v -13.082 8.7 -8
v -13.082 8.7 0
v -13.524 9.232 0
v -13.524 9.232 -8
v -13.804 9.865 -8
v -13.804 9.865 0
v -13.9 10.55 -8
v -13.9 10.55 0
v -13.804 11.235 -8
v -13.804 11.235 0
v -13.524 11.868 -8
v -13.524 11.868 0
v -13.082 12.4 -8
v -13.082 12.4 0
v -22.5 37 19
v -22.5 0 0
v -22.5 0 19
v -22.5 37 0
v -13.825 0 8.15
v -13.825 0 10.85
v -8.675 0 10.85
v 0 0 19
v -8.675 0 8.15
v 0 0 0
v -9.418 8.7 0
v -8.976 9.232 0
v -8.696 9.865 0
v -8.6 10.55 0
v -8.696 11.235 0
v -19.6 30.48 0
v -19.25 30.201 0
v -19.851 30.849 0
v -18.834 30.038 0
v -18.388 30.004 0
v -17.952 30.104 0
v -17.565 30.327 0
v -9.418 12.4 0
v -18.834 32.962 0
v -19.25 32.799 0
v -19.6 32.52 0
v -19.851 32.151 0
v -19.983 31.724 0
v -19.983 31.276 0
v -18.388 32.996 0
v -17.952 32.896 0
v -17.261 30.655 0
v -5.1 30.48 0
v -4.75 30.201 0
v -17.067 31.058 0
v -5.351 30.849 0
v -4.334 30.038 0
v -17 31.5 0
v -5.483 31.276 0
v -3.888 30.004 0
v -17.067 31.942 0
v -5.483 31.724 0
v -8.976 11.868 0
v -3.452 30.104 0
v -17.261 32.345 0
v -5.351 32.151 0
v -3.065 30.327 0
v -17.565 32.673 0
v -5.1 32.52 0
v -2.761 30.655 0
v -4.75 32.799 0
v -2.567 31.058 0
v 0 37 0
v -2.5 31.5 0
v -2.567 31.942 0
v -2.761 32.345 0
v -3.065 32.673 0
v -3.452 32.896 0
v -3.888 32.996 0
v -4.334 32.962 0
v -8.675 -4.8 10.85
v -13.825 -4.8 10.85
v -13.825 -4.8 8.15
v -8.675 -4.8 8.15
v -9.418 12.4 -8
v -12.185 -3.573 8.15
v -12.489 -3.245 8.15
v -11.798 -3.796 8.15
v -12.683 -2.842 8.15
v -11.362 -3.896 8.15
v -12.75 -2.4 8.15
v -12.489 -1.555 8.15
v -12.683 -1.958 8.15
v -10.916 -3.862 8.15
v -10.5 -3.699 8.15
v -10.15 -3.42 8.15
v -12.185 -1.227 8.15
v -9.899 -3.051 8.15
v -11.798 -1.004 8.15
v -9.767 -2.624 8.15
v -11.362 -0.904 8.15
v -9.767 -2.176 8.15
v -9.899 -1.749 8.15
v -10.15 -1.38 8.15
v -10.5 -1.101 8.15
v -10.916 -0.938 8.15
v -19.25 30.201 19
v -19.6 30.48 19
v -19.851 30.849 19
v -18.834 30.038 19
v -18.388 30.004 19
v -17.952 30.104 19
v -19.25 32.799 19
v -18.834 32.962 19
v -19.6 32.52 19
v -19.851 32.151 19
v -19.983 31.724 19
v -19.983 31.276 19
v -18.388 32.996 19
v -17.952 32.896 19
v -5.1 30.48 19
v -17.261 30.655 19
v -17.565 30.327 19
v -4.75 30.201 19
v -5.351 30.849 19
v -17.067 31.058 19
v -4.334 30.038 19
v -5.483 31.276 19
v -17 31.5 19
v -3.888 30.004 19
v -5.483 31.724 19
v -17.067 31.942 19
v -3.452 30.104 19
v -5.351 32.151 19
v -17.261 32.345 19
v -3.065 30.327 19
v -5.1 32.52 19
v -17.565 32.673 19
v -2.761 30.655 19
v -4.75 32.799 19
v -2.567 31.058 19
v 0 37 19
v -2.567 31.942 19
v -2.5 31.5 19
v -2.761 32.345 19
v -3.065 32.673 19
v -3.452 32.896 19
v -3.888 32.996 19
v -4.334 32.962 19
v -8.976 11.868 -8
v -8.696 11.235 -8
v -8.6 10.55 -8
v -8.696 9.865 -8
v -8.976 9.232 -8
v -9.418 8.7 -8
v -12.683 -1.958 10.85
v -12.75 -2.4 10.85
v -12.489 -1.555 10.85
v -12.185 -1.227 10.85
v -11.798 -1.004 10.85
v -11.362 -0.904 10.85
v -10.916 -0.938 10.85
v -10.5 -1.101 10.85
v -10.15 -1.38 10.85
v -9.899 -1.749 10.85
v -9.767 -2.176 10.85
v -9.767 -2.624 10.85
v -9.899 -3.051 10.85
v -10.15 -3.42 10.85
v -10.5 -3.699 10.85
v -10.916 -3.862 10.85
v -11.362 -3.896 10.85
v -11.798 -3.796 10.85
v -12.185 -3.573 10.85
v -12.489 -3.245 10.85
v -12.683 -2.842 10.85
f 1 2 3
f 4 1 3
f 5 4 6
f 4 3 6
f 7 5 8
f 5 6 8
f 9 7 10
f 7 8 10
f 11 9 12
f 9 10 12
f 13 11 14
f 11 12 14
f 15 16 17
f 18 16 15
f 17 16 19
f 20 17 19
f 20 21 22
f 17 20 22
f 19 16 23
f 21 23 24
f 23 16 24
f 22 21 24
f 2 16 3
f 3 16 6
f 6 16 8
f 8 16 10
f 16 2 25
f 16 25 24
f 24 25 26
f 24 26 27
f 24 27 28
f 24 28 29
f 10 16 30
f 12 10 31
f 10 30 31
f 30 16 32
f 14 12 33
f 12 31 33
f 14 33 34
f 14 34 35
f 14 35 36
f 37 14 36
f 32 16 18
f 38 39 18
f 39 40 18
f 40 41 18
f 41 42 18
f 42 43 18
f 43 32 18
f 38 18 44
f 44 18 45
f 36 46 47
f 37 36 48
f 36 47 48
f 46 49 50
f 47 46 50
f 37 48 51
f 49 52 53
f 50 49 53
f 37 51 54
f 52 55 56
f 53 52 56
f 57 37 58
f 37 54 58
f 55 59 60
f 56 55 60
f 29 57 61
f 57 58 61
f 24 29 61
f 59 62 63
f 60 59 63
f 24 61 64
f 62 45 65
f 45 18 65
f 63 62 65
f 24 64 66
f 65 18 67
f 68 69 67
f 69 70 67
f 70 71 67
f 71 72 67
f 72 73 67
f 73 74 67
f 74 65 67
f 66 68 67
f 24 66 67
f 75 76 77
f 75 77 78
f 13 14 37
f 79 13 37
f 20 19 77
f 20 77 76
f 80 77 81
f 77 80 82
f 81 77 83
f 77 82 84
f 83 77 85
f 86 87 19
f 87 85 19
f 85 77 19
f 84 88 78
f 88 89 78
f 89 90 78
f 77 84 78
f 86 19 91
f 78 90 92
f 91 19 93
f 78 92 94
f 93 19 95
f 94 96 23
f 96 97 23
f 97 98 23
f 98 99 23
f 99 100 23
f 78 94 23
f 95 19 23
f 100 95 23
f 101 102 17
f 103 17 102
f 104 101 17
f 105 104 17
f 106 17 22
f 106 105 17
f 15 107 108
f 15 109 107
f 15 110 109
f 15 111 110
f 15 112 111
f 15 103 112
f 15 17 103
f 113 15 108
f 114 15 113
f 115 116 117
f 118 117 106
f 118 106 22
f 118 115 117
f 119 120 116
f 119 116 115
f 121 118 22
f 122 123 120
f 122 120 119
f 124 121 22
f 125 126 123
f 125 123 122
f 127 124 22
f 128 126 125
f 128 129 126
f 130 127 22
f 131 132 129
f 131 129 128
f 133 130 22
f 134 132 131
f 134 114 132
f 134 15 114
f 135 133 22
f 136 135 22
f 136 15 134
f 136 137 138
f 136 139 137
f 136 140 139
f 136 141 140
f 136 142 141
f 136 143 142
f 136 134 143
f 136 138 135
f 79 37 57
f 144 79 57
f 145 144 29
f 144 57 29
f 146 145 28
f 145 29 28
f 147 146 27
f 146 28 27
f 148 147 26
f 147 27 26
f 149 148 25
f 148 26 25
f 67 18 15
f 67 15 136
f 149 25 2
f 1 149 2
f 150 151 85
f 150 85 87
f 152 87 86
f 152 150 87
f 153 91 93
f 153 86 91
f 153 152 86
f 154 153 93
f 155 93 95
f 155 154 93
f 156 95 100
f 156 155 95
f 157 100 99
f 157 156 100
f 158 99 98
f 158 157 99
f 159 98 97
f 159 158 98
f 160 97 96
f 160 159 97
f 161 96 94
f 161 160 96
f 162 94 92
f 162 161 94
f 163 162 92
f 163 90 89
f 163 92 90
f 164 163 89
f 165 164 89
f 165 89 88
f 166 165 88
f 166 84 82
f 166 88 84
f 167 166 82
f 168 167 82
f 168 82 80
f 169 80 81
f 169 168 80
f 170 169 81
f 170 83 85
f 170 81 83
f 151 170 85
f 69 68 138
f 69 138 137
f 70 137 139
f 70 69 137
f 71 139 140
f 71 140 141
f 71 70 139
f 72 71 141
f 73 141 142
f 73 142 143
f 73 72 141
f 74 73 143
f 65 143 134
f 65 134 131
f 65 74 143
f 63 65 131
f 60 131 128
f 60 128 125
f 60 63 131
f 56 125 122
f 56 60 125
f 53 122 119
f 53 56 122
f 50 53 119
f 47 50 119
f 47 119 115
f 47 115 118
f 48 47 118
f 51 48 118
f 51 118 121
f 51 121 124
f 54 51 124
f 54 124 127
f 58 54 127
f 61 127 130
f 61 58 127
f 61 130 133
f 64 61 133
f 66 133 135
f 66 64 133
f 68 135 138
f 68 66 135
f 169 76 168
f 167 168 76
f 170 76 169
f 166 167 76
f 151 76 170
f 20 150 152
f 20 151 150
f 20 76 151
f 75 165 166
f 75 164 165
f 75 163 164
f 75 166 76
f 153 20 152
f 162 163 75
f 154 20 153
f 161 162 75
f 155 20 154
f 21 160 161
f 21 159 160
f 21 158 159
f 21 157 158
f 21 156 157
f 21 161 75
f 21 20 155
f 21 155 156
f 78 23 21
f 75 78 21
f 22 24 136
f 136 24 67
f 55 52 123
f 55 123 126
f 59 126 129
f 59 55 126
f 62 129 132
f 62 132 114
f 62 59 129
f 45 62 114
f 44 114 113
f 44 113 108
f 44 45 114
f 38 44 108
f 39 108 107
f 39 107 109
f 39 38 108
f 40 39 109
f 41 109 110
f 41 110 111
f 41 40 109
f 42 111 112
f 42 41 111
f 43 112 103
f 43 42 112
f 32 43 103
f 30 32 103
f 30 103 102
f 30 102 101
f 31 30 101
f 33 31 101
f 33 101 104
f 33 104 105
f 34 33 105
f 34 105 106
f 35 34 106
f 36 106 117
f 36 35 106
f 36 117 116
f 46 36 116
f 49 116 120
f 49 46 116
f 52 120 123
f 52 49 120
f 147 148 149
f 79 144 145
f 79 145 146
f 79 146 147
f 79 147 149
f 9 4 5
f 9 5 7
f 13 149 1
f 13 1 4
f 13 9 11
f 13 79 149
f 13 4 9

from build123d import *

# Parameters (mm, degrees)
SKETCH1_W               = 22.5
SKETCH1_H               = 37
SKETCH1_R               = 1.5
BOSS_EXTRUDE1_DEPTH     = 19
BOSS_EXTRUDE2_DEPTH     = 8
SKETCH2_W               = 5.15
SKETCH2_H               = 2.7
BOSS_EXTRUDE3_DEPTH     = 4.8
CUT_EXTRUDE1_DEPTH      = 47.217664372
CUT_EXTRUDE1_DEPTH_BACK = 47.217664372
SKETCH3_R               = 1.5


with BuildPart() as part:
    # Sketch1 → Boss-Extrude1 (new body)
    with BuildSketch(Plane.XY):
        with Locations((-11.25, 18.5)):
            Rectangle(SKETCH1_W, SKETCH1_H)
        with Locations((-18.5, 31.5)):
            Circle(SKETCH1_R, mode=Mode.SUBTRACT)
        with Locations((-4, 31.5)):
            Circle(SKETCH1_R, mode=Mode.SUBTRACT)
    extrude(amount=BOSS_EXTRUDE1_DEPTH)

    # Sketch1<3> → Boss-Extrude2 (add)
    with BuildSketch(Plane.XY):
        with BuildLine():
            ThreePointArc((-13.081517172, 12.4), (-13.9, 10.55), (-13.081517172, 8.7))
            Line((-13.081517172, 8.7), (-9.418482828, 8.7))
            ThreePointArc((-9.418482828, 8.7), (-8.6, 10.55), (-9.418482828, 12.4))
            Line((-9.418482828, 12.4), (-13.081517172, 12.4))
        make_face()
    extrude(amount=-BOSS_EXTRUDE2_DEPTH)

    # Sketch2 → Boss-Extrude3 (add)
    with BuildSketch(Plane.XZ):
        with Locations((-11.25, 9.5)):
            Rectangle(SKETCH2_W, SKETCH2_H)
    extrude(amount=BOSS_EXTRUDE3_DEPTH)

    # Sketch3 → Cut-Extrude1 (cut, two sides: drawn at the far end of the back side and taken through both)
    with BuildSketch(Plane(origin=(0, 0, 8.15), x_dir=(-1, 0, 0), z_dir=(0, 0, -1)).offset(-CUT_EXTRUDE1_DEPTH_BACK)):
        with Locations((11.25, -2.4)):
            Circle(SKETCH3_R)
    extrude(amount=CUT_EXTRUDE1_DEPTH + CUT_EXTRUDE1_DEPTH_BACK, mode=Mode.SUBTRACT)


solid = part.part
